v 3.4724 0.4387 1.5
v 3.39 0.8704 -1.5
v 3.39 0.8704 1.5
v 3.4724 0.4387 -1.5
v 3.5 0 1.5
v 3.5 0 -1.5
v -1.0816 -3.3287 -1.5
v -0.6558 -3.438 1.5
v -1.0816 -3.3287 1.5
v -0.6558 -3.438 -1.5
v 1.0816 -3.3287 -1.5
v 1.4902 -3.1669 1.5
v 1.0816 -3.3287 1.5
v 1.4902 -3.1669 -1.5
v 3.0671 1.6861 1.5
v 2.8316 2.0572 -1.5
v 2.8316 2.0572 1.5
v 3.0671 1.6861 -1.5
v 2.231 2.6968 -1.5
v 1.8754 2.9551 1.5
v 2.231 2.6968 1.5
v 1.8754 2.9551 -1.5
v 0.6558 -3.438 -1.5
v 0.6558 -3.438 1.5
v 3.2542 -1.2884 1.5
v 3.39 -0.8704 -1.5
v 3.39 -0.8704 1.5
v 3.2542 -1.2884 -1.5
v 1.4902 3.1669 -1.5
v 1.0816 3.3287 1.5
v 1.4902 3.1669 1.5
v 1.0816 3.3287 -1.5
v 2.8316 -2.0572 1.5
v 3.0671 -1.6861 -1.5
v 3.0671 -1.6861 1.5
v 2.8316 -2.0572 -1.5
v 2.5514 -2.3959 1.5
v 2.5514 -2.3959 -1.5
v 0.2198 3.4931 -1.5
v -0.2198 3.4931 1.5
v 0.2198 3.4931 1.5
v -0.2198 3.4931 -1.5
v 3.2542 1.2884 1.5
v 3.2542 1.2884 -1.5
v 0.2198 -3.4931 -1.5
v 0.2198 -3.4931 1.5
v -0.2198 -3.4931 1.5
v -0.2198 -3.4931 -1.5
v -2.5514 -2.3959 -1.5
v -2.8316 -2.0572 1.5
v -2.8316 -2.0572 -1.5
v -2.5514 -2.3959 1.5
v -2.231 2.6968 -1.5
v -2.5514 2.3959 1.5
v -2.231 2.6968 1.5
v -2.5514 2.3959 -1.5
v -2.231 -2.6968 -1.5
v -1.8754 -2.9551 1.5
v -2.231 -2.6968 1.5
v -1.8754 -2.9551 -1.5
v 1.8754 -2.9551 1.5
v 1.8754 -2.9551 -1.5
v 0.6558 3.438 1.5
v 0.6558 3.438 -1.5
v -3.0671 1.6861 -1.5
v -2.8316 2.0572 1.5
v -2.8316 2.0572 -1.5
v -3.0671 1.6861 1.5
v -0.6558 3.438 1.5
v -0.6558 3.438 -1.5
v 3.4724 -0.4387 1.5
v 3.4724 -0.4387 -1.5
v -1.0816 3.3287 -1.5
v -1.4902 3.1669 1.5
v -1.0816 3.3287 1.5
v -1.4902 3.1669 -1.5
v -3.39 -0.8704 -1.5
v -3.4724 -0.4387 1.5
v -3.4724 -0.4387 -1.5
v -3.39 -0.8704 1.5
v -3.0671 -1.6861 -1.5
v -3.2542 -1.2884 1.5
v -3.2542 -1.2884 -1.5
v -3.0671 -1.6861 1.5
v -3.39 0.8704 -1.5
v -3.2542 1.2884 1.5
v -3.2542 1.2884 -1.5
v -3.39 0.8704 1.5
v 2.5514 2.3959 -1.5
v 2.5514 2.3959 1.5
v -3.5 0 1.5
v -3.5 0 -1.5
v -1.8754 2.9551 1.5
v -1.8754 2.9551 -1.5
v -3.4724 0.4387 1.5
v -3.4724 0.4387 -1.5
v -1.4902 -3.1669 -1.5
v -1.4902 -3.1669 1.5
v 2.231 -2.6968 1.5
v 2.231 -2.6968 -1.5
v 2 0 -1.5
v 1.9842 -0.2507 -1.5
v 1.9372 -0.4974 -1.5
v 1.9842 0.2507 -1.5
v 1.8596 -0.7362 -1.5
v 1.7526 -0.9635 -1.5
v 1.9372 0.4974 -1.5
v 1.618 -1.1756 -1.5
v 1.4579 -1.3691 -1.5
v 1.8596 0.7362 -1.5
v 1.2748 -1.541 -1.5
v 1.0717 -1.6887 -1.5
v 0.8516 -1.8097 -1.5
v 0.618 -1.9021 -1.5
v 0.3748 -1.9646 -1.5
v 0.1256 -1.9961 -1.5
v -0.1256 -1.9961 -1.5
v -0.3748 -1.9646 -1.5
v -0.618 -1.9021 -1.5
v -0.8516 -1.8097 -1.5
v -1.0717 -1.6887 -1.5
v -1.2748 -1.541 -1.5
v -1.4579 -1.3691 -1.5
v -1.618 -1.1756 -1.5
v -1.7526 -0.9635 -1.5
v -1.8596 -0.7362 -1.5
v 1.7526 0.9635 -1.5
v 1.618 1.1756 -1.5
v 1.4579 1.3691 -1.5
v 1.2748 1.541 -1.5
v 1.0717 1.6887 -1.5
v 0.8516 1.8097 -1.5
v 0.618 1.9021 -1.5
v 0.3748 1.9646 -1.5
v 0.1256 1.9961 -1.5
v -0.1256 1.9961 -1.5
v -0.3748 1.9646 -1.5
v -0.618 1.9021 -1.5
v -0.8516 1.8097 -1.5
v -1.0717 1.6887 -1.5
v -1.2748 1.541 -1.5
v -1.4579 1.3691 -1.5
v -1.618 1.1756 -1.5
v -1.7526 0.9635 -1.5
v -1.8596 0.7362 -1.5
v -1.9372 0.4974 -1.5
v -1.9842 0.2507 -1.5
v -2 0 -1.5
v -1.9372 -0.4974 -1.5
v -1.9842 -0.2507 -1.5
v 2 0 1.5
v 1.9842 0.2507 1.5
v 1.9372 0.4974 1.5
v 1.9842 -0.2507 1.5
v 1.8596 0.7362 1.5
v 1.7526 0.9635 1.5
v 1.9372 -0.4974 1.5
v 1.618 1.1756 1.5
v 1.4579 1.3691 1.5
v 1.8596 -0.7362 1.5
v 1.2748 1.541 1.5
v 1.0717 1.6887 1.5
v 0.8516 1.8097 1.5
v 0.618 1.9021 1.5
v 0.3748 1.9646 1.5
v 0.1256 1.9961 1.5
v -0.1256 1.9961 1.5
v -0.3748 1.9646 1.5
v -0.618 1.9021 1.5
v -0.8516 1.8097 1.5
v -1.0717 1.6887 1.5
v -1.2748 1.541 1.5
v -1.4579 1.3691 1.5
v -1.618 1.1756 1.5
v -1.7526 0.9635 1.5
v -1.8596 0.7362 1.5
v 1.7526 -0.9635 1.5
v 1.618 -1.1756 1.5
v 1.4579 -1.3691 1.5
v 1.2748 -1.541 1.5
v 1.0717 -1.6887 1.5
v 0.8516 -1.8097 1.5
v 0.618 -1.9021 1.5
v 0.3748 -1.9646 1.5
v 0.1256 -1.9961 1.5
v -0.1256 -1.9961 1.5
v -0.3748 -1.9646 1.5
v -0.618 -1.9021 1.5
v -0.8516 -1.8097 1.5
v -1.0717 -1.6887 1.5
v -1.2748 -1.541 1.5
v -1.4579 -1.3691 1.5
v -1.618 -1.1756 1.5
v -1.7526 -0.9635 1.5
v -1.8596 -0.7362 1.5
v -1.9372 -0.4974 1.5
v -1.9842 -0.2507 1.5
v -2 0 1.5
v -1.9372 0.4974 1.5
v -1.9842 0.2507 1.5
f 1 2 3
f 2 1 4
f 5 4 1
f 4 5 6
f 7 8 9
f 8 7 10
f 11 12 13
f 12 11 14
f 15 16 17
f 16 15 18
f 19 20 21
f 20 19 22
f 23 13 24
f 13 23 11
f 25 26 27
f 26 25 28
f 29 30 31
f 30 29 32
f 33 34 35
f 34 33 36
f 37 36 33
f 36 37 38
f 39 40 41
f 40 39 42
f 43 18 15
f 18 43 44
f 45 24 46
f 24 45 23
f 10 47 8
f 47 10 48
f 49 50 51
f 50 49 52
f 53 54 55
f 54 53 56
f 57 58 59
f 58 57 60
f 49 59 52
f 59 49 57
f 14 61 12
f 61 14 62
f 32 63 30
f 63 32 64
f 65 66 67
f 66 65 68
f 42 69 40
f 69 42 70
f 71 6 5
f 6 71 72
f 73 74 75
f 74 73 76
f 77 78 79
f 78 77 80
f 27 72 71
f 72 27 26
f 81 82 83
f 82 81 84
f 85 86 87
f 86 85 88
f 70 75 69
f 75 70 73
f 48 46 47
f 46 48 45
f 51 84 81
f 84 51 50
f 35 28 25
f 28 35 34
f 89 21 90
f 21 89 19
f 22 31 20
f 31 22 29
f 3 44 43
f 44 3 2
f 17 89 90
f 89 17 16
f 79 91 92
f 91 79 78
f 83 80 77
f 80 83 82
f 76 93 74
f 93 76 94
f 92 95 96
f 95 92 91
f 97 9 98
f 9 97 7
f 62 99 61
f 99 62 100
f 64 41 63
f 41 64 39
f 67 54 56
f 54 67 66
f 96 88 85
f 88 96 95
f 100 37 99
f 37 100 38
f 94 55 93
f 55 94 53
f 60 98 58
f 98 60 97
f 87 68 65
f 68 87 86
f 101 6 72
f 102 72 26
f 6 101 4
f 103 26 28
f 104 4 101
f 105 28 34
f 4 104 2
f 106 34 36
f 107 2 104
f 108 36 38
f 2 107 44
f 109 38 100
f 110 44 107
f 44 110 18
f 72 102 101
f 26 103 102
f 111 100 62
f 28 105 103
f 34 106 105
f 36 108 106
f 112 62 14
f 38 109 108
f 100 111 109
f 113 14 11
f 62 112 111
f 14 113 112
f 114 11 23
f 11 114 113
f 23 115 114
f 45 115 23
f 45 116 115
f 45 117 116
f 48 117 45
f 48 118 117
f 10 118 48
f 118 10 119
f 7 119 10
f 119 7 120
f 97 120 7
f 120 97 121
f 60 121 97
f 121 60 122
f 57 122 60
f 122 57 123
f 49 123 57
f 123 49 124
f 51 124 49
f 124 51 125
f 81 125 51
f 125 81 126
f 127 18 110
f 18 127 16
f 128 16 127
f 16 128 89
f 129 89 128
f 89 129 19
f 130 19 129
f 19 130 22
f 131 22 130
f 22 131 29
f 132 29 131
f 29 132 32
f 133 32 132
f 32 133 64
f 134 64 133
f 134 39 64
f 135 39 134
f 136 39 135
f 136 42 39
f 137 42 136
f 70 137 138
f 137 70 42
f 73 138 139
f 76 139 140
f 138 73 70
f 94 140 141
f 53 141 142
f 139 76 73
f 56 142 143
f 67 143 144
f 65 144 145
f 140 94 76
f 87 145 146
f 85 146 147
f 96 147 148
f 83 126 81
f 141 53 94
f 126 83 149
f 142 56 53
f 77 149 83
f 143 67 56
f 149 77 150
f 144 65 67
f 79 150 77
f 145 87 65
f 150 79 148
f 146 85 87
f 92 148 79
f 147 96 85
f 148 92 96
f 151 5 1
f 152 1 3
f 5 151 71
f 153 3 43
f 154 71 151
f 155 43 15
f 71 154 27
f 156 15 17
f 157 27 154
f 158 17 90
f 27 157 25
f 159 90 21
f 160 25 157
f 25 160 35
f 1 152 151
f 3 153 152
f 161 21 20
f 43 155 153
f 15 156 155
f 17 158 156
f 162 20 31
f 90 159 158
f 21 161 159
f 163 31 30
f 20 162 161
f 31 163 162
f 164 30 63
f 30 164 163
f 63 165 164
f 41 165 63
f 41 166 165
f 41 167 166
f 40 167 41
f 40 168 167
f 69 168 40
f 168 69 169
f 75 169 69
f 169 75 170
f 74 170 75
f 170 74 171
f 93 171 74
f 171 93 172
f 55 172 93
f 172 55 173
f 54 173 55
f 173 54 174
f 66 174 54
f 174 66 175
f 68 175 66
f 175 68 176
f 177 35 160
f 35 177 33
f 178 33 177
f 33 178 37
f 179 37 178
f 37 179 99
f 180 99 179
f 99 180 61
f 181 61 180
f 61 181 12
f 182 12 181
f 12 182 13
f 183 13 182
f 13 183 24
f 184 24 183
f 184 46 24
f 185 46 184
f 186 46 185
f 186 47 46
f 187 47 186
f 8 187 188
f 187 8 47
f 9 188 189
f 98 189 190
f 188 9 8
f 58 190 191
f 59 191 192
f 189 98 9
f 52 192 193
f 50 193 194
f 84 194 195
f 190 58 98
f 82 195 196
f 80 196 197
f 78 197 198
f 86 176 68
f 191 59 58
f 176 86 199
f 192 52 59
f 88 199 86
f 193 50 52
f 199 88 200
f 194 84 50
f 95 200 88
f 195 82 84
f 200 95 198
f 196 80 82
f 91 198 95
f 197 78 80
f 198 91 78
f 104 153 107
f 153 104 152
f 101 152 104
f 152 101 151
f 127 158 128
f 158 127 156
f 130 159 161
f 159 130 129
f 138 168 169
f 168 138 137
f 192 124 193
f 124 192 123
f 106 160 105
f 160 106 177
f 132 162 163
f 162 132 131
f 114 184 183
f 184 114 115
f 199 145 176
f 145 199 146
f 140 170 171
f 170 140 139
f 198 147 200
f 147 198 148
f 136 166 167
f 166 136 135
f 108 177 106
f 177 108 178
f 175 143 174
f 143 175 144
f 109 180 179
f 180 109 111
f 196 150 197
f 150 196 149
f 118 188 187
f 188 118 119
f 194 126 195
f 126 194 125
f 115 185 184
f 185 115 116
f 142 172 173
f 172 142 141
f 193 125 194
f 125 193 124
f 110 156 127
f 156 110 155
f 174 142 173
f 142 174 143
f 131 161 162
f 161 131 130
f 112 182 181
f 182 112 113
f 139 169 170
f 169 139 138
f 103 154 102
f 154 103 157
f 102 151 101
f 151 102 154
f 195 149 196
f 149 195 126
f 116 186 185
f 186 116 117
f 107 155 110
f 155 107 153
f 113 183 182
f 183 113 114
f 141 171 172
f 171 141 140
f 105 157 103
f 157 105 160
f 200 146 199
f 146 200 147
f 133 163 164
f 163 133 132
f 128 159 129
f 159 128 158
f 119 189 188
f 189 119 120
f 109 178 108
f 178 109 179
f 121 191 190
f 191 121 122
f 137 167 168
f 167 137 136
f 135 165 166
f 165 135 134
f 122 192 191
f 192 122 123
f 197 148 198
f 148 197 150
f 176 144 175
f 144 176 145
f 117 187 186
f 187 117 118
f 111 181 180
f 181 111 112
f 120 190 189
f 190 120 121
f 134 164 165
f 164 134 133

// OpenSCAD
$fn = 50;


difference() {
	union() {
		translate(v = [0, 0, -1.5000000000]) {
			cylinder(h = 3, r = 3.5000000000);
		}
	}
	union() {
		translate(v = [0, 0, -100.0000000000]) {
			cylinder(h = 200, r = 2.0000000000);
		}
	}
}
